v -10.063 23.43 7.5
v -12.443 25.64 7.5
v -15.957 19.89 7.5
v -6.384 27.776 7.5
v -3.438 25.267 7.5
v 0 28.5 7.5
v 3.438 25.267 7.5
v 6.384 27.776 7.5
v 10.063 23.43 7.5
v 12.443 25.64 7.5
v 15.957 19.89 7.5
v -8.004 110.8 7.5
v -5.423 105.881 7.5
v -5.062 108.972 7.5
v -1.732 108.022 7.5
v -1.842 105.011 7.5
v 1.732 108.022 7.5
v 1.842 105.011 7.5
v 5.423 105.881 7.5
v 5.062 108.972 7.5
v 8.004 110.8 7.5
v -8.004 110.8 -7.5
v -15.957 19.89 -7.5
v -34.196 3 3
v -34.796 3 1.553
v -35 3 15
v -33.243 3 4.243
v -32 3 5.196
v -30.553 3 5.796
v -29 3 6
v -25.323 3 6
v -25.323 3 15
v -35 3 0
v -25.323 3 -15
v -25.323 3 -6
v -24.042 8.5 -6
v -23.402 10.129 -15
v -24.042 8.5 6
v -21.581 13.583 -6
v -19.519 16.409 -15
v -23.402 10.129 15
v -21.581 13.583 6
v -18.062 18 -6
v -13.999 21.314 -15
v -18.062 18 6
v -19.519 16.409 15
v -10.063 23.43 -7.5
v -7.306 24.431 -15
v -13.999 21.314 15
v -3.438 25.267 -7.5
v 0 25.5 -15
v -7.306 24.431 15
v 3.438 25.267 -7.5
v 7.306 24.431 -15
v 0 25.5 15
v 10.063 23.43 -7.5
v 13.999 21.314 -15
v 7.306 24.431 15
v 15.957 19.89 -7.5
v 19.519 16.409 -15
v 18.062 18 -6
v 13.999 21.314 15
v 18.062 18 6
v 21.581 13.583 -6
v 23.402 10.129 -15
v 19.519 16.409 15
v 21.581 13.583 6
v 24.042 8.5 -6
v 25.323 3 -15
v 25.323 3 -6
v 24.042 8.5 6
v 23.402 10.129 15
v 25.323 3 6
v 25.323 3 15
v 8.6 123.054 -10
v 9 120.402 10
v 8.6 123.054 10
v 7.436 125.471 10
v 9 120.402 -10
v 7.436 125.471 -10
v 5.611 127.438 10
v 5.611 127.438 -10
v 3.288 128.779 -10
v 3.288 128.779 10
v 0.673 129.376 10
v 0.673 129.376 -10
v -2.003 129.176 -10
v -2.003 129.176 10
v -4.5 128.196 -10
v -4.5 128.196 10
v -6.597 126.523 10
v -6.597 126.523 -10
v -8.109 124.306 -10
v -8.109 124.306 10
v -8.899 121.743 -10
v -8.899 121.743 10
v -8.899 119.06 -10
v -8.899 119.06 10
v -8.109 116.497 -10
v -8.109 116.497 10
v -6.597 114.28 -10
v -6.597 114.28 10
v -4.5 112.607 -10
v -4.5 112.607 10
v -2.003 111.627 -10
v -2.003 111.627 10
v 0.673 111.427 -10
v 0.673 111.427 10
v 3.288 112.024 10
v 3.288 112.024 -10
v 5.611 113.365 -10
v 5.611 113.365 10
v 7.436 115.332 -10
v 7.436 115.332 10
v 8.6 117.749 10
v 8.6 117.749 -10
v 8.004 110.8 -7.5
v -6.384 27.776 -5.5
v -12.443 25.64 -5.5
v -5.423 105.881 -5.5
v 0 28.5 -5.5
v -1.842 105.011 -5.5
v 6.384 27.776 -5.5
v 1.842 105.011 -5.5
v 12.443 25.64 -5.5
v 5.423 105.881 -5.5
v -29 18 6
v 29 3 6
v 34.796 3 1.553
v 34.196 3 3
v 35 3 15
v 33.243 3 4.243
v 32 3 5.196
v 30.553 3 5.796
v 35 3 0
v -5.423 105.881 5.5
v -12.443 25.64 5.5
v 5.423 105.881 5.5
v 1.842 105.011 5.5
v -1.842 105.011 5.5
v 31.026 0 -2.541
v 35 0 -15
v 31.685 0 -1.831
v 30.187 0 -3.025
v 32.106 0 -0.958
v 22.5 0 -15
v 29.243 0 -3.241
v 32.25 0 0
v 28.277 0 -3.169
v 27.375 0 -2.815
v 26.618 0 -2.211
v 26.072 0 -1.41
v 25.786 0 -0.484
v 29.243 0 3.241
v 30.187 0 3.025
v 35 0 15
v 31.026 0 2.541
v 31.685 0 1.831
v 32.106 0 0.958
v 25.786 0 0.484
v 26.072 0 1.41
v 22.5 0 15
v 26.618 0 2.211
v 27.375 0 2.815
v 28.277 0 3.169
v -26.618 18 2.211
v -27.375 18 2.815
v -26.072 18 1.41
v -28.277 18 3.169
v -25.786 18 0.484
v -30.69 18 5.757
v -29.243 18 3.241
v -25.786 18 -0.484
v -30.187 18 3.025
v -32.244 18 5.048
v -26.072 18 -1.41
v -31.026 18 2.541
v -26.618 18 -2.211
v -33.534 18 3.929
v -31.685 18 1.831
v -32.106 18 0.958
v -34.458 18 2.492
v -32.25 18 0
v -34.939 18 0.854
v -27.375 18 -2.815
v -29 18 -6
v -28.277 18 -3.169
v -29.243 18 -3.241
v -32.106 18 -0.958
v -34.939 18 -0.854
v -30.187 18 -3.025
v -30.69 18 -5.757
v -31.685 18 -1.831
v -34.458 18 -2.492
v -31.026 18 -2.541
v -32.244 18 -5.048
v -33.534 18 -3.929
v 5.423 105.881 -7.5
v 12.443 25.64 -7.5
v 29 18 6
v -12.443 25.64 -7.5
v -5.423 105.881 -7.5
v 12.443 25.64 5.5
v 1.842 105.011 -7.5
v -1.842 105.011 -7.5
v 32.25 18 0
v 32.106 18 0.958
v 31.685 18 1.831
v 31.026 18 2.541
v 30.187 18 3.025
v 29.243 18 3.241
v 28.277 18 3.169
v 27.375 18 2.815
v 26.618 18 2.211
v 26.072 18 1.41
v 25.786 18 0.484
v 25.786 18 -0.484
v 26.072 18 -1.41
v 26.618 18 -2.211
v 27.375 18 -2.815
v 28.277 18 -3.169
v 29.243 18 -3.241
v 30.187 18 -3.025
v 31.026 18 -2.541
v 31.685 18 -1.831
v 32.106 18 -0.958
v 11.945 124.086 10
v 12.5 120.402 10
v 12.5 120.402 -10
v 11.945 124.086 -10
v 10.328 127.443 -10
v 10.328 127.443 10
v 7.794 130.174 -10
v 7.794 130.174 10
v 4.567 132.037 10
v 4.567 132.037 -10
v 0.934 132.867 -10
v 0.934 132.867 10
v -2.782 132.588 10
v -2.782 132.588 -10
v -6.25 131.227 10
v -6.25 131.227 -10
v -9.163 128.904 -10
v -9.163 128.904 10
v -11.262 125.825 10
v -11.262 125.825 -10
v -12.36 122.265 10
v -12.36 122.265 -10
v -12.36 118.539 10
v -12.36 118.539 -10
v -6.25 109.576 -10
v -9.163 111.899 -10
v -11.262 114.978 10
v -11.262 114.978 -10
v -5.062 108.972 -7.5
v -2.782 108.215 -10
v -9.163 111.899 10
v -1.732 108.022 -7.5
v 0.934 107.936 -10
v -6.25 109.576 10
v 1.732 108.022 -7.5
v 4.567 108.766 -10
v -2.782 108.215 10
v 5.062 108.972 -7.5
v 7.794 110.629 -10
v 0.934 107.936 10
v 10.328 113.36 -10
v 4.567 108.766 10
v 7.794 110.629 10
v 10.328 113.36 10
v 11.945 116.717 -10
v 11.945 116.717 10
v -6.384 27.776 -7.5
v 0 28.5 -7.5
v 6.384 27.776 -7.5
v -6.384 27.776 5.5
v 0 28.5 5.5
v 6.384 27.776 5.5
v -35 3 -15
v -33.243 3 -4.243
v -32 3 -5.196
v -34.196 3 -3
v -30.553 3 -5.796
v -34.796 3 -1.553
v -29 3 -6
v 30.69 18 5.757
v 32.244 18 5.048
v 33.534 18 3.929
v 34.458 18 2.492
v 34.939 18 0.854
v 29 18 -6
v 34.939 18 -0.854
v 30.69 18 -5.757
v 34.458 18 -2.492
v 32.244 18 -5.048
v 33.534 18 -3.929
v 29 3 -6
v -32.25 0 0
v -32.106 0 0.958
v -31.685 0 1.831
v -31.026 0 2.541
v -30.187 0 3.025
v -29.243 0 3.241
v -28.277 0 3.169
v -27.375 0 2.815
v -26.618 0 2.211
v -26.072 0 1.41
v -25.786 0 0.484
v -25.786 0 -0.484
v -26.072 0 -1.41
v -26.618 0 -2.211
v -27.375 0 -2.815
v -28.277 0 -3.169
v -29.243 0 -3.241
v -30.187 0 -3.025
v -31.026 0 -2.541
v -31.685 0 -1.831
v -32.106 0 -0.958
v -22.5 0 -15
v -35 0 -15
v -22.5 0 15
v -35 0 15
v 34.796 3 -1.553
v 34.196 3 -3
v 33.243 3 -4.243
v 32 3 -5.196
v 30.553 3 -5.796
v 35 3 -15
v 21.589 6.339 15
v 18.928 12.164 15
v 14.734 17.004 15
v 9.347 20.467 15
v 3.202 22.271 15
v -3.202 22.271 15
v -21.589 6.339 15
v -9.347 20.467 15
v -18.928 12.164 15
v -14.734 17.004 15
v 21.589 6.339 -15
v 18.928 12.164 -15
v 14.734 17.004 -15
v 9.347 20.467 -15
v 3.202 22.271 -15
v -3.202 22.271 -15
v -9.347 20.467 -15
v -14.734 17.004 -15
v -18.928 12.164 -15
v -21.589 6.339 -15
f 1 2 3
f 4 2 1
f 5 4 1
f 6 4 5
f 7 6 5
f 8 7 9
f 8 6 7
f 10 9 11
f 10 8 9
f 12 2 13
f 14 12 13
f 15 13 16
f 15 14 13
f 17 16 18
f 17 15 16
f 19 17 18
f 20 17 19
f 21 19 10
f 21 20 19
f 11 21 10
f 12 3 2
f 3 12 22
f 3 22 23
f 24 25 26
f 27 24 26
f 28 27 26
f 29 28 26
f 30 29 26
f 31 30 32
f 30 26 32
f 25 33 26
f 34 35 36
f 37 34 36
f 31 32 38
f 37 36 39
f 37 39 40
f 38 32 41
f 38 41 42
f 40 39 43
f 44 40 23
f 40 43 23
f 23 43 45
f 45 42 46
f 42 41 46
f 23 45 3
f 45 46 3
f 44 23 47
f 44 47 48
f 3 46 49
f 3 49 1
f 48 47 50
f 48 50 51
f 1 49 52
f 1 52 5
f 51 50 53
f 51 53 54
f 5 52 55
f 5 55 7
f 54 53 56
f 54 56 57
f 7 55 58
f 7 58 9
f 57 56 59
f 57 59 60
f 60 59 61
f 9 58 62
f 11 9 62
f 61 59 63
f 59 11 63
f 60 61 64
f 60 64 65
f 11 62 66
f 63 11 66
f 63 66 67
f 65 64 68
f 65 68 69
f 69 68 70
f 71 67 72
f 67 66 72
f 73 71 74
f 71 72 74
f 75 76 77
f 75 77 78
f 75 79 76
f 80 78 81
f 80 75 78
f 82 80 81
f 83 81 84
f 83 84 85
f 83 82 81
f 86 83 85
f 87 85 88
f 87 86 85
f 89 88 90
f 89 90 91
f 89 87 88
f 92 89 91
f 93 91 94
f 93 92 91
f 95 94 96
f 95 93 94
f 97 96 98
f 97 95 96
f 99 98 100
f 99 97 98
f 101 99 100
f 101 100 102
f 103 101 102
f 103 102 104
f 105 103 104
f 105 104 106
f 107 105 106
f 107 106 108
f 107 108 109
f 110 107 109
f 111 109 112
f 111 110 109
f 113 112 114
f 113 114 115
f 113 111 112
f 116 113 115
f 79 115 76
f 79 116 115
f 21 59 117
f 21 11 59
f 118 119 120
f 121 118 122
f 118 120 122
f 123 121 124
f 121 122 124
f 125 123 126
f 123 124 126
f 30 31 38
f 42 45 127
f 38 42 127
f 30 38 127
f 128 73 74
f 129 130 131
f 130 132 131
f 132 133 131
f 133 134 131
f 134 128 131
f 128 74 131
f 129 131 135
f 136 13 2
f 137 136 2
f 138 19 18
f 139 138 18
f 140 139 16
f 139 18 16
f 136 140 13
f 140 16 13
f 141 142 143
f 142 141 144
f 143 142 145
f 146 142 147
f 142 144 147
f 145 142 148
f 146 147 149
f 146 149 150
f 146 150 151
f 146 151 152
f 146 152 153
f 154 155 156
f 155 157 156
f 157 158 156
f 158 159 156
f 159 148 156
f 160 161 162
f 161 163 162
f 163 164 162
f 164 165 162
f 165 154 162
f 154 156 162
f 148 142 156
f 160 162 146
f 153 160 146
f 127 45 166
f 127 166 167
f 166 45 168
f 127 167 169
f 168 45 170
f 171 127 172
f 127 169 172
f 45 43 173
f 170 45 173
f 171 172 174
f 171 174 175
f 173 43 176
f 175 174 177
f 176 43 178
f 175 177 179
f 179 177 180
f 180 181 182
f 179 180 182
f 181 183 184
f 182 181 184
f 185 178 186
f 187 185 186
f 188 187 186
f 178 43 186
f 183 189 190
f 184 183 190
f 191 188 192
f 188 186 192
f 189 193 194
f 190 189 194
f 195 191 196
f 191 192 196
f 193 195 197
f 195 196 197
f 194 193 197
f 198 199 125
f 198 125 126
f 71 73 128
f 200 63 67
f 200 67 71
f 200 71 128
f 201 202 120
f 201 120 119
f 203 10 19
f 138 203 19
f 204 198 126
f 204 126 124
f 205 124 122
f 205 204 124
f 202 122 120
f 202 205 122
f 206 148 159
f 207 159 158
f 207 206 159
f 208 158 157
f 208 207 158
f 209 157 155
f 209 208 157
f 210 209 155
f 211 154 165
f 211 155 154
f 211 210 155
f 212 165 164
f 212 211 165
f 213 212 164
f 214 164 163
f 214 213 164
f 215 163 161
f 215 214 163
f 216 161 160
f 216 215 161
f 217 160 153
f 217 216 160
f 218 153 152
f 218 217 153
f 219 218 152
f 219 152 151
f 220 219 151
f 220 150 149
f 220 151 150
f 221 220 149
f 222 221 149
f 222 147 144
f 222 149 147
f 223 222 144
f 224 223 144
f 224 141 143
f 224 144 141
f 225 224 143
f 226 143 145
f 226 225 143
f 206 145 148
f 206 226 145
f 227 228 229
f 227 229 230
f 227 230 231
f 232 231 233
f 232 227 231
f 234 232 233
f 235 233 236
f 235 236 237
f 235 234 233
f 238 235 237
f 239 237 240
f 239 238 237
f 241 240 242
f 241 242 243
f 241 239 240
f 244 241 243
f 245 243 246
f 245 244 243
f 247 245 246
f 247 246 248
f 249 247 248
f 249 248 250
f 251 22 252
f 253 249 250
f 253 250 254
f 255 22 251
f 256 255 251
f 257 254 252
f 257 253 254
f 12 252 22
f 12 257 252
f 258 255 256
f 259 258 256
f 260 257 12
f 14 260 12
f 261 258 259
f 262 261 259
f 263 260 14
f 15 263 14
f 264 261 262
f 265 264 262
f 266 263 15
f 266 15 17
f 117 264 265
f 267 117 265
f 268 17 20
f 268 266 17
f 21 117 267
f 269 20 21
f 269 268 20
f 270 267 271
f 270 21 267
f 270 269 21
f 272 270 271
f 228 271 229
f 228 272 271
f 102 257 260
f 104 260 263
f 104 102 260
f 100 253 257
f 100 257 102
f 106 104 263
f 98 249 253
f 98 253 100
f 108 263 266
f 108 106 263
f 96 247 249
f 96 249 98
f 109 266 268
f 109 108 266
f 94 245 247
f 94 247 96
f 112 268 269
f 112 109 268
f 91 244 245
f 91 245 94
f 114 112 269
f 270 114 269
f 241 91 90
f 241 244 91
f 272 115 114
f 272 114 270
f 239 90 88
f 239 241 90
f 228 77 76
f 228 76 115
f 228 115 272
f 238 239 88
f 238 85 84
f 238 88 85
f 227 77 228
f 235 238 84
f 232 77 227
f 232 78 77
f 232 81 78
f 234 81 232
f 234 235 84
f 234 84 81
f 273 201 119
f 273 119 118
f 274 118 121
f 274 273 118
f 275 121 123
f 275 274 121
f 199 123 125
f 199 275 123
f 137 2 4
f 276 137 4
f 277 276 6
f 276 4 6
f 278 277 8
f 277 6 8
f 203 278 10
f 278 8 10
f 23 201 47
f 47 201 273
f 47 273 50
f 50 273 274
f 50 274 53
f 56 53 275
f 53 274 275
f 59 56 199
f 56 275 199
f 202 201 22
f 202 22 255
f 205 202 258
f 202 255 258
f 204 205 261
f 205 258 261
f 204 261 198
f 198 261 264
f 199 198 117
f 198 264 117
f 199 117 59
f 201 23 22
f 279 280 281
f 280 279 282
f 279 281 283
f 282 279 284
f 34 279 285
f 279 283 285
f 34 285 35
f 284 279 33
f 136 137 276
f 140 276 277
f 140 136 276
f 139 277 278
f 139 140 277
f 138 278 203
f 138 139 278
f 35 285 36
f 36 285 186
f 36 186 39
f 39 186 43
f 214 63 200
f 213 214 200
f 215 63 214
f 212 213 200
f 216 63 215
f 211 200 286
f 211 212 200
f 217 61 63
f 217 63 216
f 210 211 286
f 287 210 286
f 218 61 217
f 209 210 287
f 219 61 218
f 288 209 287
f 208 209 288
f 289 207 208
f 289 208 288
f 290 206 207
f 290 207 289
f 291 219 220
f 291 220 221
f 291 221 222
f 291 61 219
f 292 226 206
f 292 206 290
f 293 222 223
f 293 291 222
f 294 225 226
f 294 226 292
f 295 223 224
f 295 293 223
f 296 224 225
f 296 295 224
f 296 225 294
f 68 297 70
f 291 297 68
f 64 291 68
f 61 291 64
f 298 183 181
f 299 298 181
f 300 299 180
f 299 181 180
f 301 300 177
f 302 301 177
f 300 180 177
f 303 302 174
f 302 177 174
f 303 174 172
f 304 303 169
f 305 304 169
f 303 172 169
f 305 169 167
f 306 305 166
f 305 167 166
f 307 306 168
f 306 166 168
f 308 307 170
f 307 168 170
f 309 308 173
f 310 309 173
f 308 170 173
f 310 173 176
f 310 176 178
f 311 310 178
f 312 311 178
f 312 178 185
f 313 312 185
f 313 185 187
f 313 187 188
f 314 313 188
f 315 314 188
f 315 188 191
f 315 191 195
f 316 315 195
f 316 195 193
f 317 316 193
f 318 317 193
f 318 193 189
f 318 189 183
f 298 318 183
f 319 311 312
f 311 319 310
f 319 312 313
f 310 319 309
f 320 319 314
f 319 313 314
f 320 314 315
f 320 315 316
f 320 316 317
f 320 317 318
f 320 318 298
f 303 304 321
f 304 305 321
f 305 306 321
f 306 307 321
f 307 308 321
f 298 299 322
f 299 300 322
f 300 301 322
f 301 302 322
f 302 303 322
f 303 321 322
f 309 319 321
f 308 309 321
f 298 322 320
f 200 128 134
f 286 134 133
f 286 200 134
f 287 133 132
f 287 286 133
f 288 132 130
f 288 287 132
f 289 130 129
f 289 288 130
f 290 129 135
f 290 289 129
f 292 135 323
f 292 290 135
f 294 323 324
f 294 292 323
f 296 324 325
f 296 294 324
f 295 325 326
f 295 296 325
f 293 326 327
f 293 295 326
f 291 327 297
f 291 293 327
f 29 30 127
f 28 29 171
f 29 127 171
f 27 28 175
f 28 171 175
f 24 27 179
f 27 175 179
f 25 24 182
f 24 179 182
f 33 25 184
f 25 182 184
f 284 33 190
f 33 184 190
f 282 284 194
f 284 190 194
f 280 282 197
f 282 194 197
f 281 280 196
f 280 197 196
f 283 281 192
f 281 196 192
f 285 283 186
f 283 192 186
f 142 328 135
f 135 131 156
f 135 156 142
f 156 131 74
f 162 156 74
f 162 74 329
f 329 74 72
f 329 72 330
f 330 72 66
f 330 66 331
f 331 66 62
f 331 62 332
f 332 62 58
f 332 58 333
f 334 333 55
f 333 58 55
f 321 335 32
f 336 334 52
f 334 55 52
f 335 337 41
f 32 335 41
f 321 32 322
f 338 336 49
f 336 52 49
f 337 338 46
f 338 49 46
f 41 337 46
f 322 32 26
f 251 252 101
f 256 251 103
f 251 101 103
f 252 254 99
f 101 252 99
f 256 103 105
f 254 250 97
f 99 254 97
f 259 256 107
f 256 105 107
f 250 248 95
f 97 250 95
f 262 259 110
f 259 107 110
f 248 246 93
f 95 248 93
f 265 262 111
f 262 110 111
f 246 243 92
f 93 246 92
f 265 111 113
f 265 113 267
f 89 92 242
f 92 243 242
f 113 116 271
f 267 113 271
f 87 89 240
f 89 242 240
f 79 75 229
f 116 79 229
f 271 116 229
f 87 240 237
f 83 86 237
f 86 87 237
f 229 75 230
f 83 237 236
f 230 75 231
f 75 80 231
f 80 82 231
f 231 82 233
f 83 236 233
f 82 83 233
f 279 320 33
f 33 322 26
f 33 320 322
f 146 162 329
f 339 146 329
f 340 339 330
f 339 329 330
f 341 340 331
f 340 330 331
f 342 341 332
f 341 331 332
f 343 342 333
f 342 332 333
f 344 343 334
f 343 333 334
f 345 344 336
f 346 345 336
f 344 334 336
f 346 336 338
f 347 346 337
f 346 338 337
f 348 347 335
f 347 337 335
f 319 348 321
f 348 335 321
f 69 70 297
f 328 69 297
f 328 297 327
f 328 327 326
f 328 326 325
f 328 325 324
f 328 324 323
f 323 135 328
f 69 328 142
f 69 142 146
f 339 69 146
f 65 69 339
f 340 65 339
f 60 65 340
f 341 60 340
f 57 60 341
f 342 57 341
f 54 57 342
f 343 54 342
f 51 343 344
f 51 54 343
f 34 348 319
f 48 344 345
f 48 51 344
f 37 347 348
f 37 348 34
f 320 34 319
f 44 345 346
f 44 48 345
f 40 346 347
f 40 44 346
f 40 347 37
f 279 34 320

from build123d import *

# Parameters (mm, degrees)
BOSS_EXTRUDE1_DEPTH = 15
BOSS_EXTRUDE2_REACH = 44.119
SKETCH4_R           = 3.25
CUT_EXTRUDE1_DEPTH  = 43.118879377
BOSS_EXTRUDE3_DEPTH = 7.5
CUT_EXTRUDE2_DEPTH  = 2
SKETCH9_R           = 12.5
SKETCH9_R_2         = 9
BOSS_EXTRUDE4_DEPTH = 10


with BuildPart() as part:
    # Sketch1 → Boss-Extrude1 (new, symmetric)
    with BuildSketch(Plane.XY):
        with BuildLine():
            Line((-22.5, 0), (-35, 0))
            Line((-35, 0), (-35, 3))
            Line((-35, 3), (-25.322914524, 3))
            ThreePointArc((-25.322914524, 3), (0, 25.5), (25.322914524, 3))
            Line((25.322914524, 3), (35, 3))
            Line((35, 3), (35, 0))
            Line((35, 0), (22.5, 0))
            ThreePointArc((22.5, 0), (0, 22.5), (-22.5, 0))
        make_face()
    extrude(amount=BOSS_EXTRUDE1_DEPTH, both=True)

    # Sketch3 → Boss-Extrude2 (add, up to next)
    with BuildSketch(Plane(origin=(0, 18, 0), x_dir=(1, 0, 0), z_dir=(0, 1, 0)), mode=Mode.PRIVATE) as boss_extrude2_sk1:
        with BuildLine():
            Line((-18.06, 6), (-18.06, -6))
            Line((-18.06, -6), (-29, -6))
            ThreePointArc((-29, -6), (-35, 0), (-29, 6))
            Line((-29, 6), (-18.06, 6))
        make_face()
    boss_extrude2_tool1 = extrude(boss_extrude2_sk1.sketch, amount=-BOSS_EXTRUDE2_REACH, mode=Mode.PRIVATE) - part.part
    boss_extrude2 = boss_extrude2_tool1.solids().sort_by_distance((-25.943483, 18, 0))[0]
    add(boss_extrude2)

    # Sketch4 → Cut-Extrude1 (cut, through all)
    with BuildSketch(Plane(origin=(0, 18, 0), x_dir=(1, 0, 0), z_dir=(0, 1, 0))):
        with Locations(Location((-29, 0, 0), (0, 0, 180))):
            Circle(SKETCH4_R)
    cut_extrude1 = extrude(amount=-CUT_EXTRUDE1_DEPTH, mode=Mode.SUBTRACT)

    # Mirror1: Boss-Extrude2, Cut-Extrude1 across plane
    add(boss_extrude2.mirror(Plane(origin=(0, 0, 0), x_dir=(0, 0, 1), z_dir=(1, 0, 0))))
    add(cut_extrude1.mirror(Plane(origin=(0, 0, 0), x_dir=(0, 0, 1), z_dir=(1, 0, 0))), mode=Mode.SUBTRACT)

    # Sketch6 → Boss-Extrude3 (add, symmetric)
    with BuildSketch(Plane.XY):
        with BuildLine():
            Line((15.957377604, 19.89), (8.003783203, 110.8))
            ThreePointArc((8.003783203, 110.8), (0, 107.901533963), (-8.003783203, 110.8))
            Line((-8.003783203, 110.8), (-15.957377604, 19.89))
            ThreePointArc((-15.957377604, 19.89), (0, 25.5), (15.957377604, 19.89))
        make_face()
    extrude(amount=BOSS_EXTRUDE3_DEPTH, both=True)

    # Sketch7 → Cut-Extrude2 (cut)
    with BuildSketch(Plane.XY.offset(7.5)):
        with BuildLine():
            Line((-5.422676431, 105.881045668), (-12.442830342, 25.640319286))
            ThreePointArc((-12.442830342, 25.640319286), (0, 28.5), (12.442830342, 25.640319286))
            Line((12.442830342, 25.640319286), (5.422676431, 105.881045668))
            ThreePointArc((5.422676431, 105.881045668), (0, 104.901533963), (-5.422676431, 105.881045668))
        make_face()
    cut_extrude2 = extrude(amount=-CUT_EXTRUDE2_DEPTH, mode=Mode.SUBTRACT)

    # Mirror2: Cut-Extrude2 across plane
    add(cut_extrude2.mirror(Plane.XY), mode=Mode.SUBTRACT)

    # Sketch9 → Boss-Extrude4 (add, symmetric)
    with BuildSketch(Plane.XY):
        with Locations((0, 120.401533963)):
            Circle(SKETCH9_R)
        with Locations((0, 120.401533963)):
            Circle(SKETCH9_R_2, mode=Mode.SUBTRACT)
    extrude(amount=BOSS_EXTRUDE4_DEPTH, both=True)


solid = part.part
